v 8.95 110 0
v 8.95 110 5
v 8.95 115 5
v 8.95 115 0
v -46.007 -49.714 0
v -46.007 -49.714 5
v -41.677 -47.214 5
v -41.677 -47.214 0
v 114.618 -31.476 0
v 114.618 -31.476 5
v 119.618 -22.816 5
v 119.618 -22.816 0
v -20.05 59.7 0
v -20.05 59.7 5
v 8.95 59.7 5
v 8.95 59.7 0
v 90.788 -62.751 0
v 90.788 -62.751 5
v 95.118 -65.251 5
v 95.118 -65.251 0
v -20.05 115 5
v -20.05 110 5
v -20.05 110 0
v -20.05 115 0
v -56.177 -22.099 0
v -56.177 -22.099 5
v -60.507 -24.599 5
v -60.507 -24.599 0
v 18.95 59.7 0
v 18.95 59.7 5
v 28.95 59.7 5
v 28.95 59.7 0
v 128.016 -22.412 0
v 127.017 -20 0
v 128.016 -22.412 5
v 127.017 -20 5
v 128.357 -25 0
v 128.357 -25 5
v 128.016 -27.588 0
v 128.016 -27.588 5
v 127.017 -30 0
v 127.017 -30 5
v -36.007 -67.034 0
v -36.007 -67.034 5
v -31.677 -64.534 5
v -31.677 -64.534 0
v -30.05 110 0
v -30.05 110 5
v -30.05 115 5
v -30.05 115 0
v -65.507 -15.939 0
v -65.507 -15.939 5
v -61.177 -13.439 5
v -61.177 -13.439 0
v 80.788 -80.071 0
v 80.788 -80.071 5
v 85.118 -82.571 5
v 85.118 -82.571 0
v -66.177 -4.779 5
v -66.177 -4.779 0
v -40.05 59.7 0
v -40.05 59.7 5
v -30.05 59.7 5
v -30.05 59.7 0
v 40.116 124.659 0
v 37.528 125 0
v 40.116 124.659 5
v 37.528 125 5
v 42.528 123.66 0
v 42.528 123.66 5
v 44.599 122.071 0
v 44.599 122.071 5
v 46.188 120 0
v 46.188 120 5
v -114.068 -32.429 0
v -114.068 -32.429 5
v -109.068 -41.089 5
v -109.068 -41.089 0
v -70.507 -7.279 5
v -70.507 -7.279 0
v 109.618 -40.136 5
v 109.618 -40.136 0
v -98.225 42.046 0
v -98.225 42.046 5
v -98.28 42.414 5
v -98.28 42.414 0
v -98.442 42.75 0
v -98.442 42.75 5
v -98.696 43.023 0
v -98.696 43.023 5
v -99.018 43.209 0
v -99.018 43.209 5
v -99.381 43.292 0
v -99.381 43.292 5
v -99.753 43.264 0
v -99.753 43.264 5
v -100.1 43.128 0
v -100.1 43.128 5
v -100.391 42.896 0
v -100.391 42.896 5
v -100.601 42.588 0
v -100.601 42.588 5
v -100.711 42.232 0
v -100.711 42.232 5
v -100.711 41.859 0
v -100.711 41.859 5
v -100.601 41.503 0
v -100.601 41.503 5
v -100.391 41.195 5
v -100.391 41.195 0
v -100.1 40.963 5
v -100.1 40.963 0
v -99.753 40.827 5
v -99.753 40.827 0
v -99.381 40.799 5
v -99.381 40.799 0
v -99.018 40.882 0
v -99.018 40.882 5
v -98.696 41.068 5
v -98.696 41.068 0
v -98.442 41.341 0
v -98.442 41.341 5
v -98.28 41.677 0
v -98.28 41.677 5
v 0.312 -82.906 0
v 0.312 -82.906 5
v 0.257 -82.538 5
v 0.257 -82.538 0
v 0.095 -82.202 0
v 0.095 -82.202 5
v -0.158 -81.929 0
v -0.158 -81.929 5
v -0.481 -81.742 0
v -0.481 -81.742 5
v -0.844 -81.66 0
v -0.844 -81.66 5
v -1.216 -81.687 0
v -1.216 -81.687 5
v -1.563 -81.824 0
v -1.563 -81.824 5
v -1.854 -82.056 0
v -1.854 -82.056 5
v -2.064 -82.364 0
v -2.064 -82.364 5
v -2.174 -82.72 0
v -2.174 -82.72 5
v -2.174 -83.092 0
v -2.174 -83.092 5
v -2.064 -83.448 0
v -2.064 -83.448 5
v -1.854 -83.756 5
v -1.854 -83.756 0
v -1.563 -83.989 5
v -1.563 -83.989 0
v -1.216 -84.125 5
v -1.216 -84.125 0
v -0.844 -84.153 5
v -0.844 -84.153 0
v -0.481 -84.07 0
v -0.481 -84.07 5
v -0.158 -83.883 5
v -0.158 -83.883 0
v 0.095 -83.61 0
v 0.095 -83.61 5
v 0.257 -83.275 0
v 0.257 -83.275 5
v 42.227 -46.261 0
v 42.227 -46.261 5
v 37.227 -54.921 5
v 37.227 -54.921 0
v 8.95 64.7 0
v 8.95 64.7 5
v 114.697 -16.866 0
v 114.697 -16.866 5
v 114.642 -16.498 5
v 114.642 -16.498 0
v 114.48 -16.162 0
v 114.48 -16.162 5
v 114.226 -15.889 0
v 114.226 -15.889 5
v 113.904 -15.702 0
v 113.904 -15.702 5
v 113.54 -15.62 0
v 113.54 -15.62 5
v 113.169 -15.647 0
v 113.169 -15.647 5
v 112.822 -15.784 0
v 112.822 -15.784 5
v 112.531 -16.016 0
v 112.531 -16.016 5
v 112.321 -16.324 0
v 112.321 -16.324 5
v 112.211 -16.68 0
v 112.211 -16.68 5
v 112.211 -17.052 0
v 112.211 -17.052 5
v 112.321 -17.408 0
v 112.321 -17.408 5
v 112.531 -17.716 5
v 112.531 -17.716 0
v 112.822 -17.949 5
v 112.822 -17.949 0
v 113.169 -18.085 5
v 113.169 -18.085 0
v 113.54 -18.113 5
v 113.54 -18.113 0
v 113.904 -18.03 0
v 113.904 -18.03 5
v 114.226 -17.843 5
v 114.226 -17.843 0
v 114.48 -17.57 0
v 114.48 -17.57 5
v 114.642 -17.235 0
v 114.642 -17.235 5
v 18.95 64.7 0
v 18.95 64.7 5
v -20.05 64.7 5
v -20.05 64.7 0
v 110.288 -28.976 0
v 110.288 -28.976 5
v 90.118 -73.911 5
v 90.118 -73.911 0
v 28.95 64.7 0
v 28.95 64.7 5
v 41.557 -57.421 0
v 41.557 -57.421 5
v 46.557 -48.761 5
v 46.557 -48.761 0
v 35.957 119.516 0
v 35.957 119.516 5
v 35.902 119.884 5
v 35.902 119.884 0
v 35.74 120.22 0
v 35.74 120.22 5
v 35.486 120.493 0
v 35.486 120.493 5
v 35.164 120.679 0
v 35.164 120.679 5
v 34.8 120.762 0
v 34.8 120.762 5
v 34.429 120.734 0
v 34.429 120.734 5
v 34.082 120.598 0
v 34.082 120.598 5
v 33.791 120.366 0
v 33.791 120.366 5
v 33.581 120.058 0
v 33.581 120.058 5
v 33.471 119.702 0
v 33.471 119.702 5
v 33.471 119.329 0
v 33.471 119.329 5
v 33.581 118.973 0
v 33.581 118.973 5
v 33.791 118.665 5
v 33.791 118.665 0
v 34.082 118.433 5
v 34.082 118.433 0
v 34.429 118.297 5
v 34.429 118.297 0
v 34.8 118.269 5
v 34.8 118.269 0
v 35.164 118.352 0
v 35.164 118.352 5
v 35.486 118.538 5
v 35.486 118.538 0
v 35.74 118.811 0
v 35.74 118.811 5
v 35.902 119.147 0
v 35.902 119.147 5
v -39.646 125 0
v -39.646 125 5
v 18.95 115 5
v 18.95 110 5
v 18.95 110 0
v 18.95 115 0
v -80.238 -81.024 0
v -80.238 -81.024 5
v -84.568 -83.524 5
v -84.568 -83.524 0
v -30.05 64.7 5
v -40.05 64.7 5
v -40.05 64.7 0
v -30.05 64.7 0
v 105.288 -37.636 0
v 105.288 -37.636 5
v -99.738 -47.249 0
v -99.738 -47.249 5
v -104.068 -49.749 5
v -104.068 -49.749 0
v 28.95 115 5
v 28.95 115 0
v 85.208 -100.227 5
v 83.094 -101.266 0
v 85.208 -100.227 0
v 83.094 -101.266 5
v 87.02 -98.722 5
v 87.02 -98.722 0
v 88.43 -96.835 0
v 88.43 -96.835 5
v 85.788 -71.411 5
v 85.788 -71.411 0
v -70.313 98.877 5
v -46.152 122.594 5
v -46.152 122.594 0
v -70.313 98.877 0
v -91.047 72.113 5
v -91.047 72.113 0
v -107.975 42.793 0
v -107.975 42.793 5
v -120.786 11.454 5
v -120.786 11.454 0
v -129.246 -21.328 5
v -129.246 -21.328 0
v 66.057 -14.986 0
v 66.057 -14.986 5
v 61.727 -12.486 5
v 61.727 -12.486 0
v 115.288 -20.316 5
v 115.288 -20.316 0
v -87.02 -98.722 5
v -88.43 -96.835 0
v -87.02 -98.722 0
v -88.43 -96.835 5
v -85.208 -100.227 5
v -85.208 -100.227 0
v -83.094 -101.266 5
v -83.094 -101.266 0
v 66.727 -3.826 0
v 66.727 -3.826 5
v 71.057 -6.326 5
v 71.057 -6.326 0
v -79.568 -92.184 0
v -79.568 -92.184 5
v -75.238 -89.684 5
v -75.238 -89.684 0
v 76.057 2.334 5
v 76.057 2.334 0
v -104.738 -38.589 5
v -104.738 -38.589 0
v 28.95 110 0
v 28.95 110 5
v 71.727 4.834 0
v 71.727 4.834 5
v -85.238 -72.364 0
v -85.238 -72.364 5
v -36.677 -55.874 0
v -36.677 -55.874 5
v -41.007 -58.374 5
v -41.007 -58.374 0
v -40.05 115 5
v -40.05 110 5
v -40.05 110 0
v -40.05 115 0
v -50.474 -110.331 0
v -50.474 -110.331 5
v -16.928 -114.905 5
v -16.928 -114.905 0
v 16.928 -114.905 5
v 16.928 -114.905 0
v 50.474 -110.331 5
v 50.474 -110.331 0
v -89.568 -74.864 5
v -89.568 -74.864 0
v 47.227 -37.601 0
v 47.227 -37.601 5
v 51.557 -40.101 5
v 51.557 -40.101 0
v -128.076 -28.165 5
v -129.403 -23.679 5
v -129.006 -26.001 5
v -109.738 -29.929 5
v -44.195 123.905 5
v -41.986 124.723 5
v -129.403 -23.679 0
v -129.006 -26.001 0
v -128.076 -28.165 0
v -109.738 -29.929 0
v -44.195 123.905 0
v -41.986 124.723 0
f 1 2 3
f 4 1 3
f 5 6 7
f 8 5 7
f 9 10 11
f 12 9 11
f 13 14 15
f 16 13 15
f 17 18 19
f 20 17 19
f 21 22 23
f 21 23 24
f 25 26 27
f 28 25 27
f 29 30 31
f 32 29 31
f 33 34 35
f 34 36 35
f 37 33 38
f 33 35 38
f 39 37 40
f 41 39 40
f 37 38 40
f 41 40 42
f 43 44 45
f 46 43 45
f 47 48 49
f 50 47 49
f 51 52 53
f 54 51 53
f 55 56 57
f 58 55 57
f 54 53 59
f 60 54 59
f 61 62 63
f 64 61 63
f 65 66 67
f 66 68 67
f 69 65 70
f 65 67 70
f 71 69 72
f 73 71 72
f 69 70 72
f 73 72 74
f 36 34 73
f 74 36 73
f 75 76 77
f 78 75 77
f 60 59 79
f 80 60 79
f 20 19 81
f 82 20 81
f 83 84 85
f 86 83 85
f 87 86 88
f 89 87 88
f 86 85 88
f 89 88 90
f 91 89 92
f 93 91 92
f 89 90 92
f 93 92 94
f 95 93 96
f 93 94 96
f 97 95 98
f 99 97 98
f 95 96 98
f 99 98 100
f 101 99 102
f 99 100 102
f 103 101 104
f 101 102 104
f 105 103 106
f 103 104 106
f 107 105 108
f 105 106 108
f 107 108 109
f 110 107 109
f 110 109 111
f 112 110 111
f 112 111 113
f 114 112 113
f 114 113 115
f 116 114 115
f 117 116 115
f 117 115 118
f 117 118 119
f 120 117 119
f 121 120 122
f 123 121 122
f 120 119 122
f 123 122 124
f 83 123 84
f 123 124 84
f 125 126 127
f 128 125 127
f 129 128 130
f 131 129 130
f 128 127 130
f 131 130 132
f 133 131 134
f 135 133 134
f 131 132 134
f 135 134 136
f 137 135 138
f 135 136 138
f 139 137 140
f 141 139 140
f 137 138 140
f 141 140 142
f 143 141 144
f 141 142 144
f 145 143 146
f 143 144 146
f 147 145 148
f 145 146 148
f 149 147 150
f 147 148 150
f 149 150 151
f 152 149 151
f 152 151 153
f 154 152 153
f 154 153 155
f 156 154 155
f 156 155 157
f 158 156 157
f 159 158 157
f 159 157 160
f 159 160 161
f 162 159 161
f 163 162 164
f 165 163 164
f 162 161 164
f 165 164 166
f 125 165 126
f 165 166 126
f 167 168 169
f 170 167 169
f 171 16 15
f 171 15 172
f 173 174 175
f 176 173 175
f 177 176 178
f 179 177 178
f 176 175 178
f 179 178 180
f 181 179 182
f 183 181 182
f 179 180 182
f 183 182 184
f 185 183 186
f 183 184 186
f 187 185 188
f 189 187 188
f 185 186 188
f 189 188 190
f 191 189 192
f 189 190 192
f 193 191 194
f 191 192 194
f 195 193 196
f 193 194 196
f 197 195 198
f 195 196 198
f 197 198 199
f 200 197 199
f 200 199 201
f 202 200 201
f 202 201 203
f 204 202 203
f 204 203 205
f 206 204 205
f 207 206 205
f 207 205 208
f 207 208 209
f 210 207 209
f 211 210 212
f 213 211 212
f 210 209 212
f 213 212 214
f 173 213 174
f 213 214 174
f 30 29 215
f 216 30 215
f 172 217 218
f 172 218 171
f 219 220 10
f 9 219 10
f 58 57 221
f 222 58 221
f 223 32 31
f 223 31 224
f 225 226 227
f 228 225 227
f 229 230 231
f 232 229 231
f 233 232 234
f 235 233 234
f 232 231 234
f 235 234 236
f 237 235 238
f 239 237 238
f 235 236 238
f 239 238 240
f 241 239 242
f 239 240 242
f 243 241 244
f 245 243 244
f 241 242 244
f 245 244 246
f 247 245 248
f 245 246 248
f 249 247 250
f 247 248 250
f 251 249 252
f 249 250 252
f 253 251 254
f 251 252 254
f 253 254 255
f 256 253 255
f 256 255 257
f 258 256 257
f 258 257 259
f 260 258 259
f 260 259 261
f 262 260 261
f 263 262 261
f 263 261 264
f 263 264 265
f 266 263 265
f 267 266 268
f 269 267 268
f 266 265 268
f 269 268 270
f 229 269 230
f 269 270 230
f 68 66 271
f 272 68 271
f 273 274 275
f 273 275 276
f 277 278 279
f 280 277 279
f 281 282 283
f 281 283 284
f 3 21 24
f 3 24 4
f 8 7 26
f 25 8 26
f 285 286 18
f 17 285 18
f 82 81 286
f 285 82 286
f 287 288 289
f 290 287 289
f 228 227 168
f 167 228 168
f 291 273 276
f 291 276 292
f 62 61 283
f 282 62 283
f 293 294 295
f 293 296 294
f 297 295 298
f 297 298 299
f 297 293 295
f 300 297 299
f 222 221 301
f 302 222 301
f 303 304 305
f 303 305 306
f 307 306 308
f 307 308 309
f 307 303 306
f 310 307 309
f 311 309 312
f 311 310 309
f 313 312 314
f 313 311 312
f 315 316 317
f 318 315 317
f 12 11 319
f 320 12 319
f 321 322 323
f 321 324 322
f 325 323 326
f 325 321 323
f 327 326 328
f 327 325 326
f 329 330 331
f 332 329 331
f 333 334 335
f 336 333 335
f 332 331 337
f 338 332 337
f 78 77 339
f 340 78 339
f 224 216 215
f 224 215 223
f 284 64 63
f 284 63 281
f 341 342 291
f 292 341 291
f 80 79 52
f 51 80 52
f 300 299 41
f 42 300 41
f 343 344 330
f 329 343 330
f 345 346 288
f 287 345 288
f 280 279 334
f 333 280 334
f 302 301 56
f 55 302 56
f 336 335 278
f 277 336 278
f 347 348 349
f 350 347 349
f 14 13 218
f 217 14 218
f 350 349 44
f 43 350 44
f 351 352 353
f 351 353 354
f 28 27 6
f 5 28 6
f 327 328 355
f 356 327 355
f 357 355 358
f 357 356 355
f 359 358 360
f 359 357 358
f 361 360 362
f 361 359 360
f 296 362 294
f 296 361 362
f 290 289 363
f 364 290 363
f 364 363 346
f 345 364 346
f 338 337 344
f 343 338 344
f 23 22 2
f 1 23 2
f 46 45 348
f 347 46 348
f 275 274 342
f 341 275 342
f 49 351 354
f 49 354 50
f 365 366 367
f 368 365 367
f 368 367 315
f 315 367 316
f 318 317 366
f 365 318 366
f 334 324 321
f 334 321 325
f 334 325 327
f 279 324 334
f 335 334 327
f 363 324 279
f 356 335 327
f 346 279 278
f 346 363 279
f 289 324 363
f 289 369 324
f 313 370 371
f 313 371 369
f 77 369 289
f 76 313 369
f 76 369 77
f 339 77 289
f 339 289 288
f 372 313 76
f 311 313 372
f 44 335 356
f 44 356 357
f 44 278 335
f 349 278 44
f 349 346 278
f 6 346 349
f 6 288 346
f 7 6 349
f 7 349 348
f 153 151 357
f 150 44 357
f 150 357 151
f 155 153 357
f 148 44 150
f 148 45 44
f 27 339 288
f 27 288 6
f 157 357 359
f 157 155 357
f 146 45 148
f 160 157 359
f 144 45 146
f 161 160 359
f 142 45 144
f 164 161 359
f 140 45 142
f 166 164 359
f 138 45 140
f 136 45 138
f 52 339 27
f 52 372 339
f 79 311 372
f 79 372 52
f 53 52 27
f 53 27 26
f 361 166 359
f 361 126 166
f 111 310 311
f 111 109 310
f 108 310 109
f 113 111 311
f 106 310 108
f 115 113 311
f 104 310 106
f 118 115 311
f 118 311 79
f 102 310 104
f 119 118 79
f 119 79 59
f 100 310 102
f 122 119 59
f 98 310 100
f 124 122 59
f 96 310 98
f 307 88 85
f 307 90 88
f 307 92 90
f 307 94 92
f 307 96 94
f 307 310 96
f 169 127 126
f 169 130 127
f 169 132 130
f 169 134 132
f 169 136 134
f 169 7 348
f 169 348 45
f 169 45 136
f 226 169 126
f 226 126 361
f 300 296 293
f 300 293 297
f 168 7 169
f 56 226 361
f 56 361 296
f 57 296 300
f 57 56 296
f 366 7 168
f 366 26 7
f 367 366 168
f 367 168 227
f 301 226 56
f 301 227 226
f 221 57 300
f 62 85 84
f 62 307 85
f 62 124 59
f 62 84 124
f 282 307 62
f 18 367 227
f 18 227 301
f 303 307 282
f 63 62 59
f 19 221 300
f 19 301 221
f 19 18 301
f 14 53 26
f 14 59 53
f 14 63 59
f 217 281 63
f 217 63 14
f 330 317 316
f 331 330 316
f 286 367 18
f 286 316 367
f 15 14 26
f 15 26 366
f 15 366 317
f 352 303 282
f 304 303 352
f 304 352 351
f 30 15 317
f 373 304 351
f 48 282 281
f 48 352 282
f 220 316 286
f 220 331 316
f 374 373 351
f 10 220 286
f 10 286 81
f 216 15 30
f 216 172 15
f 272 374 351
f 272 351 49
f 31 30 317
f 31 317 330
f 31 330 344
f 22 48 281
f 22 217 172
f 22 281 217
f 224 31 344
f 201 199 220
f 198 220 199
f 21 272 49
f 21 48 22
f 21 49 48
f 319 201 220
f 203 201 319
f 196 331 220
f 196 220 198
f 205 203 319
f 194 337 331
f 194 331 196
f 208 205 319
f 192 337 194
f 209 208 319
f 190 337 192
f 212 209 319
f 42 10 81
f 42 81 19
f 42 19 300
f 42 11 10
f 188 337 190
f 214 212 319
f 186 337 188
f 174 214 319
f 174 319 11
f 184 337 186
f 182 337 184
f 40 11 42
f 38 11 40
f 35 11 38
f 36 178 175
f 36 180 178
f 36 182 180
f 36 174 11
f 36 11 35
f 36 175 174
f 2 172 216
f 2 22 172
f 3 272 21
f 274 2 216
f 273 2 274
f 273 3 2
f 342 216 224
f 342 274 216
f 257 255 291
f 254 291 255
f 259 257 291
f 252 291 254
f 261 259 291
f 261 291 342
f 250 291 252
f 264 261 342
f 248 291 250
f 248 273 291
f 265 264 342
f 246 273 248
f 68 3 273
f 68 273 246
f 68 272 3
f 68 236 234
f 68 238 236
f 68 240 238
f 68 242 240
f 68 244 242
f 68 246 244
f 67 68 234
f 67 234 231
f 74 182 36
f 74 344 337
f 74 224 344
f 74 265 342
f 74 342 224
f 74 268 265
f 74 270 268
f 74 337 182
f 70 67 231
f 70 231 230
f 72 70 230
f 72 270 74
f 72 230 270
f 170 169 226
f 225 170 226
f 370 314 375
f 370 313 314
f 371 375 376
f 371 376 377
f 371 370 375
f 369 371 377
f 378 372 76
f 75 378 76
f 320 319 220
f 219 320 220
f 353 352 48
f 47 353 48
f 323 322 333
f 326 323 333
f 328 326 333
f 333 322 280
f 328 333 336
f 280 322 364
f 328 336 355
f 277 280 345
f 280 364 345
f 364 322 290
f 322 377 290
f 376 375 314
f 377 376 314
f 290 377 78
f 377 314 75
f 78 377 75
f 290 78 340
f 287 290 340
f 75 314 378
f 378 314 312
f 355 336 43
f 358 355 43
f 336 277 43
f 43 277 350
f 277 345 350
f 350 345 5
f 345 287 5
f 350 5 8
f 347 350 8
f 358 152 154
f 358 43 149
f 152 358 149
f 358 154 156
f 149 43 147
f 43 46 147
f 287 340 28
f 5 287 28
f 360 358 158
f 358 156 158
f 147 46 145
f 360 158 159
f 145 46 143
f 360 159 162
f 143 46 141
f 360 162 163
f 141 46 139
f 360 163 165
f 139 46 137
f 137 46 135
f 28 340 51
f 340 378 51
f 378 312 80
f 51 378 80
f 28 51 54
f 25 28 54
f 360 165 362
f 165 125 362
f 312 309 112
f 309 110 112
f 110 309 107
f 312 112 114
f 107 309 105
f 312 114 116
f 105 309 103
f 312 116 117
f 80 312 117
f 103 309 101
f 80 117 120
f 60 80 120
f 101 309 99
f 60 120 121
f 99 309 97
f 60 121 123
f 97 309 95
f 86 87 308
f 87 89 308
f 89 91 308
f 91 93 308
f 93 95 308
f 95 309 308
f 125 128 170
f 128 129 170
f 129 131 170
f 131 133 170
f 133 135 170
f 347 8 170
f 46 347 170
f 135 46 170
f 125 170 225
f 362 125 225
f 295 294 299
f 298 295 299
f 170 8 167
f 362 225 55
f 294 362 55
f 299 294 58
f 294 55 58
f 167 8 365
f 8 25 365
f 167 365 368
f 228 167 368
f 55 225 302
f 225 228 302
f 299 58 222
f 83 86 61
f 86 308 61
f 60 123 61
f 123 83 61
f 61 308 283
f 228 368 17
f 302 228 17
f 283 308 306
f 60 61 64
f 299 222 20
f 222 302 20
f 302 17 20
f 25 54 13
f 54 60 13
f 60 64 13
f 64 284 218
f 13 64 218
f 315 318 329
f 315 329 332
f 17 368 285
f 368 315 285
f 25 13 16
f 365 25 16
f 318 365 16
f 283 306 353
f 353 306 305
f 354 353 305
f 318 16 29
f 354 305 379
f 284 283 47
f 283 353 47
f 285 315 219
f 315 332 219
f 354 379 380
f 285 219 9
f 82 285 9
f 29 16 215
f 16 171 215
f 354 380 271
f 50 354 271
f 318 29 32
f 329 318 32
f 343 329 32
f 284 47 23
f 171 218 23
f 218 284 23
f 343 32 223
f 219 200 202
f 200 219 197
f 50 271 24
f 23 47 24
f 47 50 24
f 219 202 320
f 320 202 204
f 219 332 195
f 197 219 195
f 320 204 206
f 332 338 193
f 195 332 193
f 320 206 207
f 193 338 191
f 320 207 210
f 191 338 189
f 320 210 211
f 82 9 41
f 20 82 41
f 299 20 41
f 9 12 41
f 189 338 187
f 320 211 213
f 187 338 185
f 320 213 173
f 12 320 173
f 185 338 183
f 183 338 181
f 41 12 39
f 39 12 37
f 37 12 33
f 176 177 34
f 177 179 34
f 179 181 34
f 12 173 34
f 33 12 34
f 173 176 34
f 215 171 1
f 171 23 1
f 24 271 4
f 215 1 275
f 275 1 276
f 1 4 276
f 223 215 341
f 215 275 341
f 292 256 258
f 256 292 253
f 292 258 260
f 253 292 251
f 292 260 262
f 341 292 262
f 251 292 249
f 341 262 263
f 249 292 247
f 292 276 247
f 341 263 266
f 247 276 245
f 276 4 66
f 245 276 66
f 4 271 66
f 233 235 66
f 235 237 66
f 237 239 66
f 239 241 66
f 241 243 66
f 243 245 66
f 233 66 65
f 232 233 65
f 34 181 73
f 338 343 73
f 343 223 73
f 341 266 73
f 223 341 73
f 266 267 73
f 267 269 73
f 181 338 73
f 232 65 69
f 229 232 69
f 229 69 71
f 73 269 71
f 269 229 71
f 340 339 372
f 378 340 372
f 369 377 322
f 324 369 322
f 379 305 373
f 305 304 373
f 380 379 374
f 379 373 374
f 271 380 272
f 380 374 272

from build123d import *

# Parameters (mm, degrees)
BOSS_EXTRUDE1_DEPTH = 5
BOSS_EXTRUDE2_DEPTH = 5
SKETCH4_W           = 10
SKETCH4_H           = 5
SKETCH4_W_2         = 29
CUT_EXTRUDE2_DEPTH  = 5
BOSS_EXTRUDE3_DEPTH = 5
SKETCH7_R           = 1.25
CUT_EXTRUDE4_DEPTH  = 5
FILLET2_R           = 10


with BuildPart() as part:
    # Sketch1 → Boss-Extrude1 (new body)
    with BuildSketch(Plane(origin=(0, 0, 0), x_dir=(0.8660254037844434, -0.49999999999999206, 0), z_dir=(0, 0, 1))):
        Polygon((125, -43.301270189), (125, 43.301270189), (-25, 129.903810568), (-100, 86.602540378), (-100, -86.602540378), (-25, -129.903810568), align=None)
    extrude(amount=BOSS_EXTRUDE1_DEPTH)

    # Sketch3 → Boss-Extrude2 (add)
    with BuildSketch(Plane.XY.offset(5)):
        Polygon((-86.602540378, -100), (86.602540378, -100), (129.903810568, -25), (43.301270189, 125), (-43.301270189, 125), (-129.903810568, -25), align=None)
    extrude(amount=-BOSS_EXTRUDE2_DEPTH)

    # Sketch4 → Cut-Extrude2 (cut)
    with BuildSketch(Plane.XY.offset(5)):
        with Locations((-35.05, 112.5)):
            Rectangle(SKETCH4_W, SKETCH4_H)
        with Locations((23.95, 112.5)):
            Rectangle(SKETCH4_W, SKETCH4_H)
        with Locations((-5.55, 112.5)):
            Rectangle(SKETCH4_W_2, SKETCH4_H)
        with Locations((-35.05, 62.1999492)):
            Rectangle(SKETCH4_W, SKETCH4_H)
        with Locations((23.95, 62.1999492)):
            Rectangle(SKETCH4_W, SKETCH4_H)
        with Locations((-5.55, 62.1999492)):
            Rectangle(SKETCH4_W_2, SKETCH4_H)
        Polygon((115.287794416, -20.315682578), (110.287794416, -28.975936616), (114.617921435, -31.475936616), (119.617921435, -22.815682578), align=None)
        Polygon((80.787794416, -80.07143544), (85.117921435, -82.57143544), (90.117921435, -73.911181402), (85.787794416, -71.411181402), align=None)
        Polygon((109.617921435, -40.136190654), (105.287794416, -37.636190654), (90.787794416, -62.750927364), (95.117921435, -65.250927364), align=None)
        Polygon((71.726672612, 4.834342822), (66.726672612, -3.825911216), (71.056799631, -6.325911216), (76.056799631, 2.334342822), align=None)
        Polygon((37.226672612, -54.92141004), (41.556799631, -57.42141004), (46.556799631, -48.761156002), (42.226672612, -46.261156002), align=None)
        Polygon((66.056799631, -14.986165254), (61.726672612, -12.486165254), (47.226672612, -37.600901964), (51.556799631, -40.100901964), align=None)
        Polygon((-75.237794416, -89.684317422), (-80.237794416, -81.024063384), (-84.567921435, -83.524063384), (-79.567921435, -92.184317422), align=None)
        Polygon((-109.737794416, -29.92856456), (-114.067921435, -32.42856456), (-109.067921435, -41.088818598), (-104.737794416, -38.588818598), align=None)
        Polygon((-89.567921435, -74.863809346), (-85.237794416, -72.363809346), (-99.737794416, -47.249072636), (-104.067921435, -49.749072636), align=None)
        Polygon((-31.676672612, -64.534292022), (-36.676672612, -55.874037984), (-41.006799631, -58.374037984), (-36.006799631, -67.034292022), align=None)
        Polygon((-66.176672612, -4.77853916), (-70.506799631, -7.27853916), (-65.506799631, -15.938793198), (-61.176672612, -13.438793198), align=None)
        Polygon((-46.006799631, -49.713783946), (-41.676672612, -47.213783946), (-56.176672612, -22.099047236), (-60.506799631, -24.599047236), align=None)
    extrude(amount=-CUT_EXTRUDE2_DEPTH, mode=Mode.SUBTRACT)

    # Sketch5 → Boss-Extrude3 (add)
    with BuildSketch(Plane.XY.offset(5)):
        with BuildLine():
            ThreePointArc((-43.301270189, 125), (-100.007931209, 57.739606004), (-129.903810568, -25))
            Line((-129.903810568, -25), (-43.301270189, 125))
        make_face()
        with BuildLine():
            ThreePointArc((-86.602540378, -100), (0, -115.479212009), (86.602540378, -100))
            Line((86.602540378, -100), (-86.602540378, -100))
        make_face()
    extrude(amount=-BOSS_EXTRUDE3_DEPTH)

    # Sketch7 → Cut-Extrude4 (cut)
    with BuildSketch(Plane.XY.offset(5)):
        with Locations((-99.474904421, 42.045588536)):
            Circle(SKETCH7_R)
        with Locations((34.707071641, 119.515588536)):
            Circle(SKETCH7_R)
        with Locations((113.447071641, -16.866092052)):
            Circle(SKETCH7_R)
        with Locations((-0.937563691, -82.906092052)):
            Circle(SKETCH7_R)
    extrude(amount=-CUT_EXTRUDE4_DEPTH, mode=Mode.SUBTRACT)

    # Fillet2
    fillet2_edges = [part.edges().sort_by_distance(p)[0] for p in [
        (-86.602540378, -100, 2.5),
        (-129.903810568, -25, 2.5),
        (-43.301270189, 125, 2.5),
        (43.301270189, 125, 2.5),
        (129.903810568, -25, 2.5),
        (86.602540378, -100, 2.5),
    ]]
    fillet(fillet2_edges, radius=FILLET2_R)


solid = part.part
